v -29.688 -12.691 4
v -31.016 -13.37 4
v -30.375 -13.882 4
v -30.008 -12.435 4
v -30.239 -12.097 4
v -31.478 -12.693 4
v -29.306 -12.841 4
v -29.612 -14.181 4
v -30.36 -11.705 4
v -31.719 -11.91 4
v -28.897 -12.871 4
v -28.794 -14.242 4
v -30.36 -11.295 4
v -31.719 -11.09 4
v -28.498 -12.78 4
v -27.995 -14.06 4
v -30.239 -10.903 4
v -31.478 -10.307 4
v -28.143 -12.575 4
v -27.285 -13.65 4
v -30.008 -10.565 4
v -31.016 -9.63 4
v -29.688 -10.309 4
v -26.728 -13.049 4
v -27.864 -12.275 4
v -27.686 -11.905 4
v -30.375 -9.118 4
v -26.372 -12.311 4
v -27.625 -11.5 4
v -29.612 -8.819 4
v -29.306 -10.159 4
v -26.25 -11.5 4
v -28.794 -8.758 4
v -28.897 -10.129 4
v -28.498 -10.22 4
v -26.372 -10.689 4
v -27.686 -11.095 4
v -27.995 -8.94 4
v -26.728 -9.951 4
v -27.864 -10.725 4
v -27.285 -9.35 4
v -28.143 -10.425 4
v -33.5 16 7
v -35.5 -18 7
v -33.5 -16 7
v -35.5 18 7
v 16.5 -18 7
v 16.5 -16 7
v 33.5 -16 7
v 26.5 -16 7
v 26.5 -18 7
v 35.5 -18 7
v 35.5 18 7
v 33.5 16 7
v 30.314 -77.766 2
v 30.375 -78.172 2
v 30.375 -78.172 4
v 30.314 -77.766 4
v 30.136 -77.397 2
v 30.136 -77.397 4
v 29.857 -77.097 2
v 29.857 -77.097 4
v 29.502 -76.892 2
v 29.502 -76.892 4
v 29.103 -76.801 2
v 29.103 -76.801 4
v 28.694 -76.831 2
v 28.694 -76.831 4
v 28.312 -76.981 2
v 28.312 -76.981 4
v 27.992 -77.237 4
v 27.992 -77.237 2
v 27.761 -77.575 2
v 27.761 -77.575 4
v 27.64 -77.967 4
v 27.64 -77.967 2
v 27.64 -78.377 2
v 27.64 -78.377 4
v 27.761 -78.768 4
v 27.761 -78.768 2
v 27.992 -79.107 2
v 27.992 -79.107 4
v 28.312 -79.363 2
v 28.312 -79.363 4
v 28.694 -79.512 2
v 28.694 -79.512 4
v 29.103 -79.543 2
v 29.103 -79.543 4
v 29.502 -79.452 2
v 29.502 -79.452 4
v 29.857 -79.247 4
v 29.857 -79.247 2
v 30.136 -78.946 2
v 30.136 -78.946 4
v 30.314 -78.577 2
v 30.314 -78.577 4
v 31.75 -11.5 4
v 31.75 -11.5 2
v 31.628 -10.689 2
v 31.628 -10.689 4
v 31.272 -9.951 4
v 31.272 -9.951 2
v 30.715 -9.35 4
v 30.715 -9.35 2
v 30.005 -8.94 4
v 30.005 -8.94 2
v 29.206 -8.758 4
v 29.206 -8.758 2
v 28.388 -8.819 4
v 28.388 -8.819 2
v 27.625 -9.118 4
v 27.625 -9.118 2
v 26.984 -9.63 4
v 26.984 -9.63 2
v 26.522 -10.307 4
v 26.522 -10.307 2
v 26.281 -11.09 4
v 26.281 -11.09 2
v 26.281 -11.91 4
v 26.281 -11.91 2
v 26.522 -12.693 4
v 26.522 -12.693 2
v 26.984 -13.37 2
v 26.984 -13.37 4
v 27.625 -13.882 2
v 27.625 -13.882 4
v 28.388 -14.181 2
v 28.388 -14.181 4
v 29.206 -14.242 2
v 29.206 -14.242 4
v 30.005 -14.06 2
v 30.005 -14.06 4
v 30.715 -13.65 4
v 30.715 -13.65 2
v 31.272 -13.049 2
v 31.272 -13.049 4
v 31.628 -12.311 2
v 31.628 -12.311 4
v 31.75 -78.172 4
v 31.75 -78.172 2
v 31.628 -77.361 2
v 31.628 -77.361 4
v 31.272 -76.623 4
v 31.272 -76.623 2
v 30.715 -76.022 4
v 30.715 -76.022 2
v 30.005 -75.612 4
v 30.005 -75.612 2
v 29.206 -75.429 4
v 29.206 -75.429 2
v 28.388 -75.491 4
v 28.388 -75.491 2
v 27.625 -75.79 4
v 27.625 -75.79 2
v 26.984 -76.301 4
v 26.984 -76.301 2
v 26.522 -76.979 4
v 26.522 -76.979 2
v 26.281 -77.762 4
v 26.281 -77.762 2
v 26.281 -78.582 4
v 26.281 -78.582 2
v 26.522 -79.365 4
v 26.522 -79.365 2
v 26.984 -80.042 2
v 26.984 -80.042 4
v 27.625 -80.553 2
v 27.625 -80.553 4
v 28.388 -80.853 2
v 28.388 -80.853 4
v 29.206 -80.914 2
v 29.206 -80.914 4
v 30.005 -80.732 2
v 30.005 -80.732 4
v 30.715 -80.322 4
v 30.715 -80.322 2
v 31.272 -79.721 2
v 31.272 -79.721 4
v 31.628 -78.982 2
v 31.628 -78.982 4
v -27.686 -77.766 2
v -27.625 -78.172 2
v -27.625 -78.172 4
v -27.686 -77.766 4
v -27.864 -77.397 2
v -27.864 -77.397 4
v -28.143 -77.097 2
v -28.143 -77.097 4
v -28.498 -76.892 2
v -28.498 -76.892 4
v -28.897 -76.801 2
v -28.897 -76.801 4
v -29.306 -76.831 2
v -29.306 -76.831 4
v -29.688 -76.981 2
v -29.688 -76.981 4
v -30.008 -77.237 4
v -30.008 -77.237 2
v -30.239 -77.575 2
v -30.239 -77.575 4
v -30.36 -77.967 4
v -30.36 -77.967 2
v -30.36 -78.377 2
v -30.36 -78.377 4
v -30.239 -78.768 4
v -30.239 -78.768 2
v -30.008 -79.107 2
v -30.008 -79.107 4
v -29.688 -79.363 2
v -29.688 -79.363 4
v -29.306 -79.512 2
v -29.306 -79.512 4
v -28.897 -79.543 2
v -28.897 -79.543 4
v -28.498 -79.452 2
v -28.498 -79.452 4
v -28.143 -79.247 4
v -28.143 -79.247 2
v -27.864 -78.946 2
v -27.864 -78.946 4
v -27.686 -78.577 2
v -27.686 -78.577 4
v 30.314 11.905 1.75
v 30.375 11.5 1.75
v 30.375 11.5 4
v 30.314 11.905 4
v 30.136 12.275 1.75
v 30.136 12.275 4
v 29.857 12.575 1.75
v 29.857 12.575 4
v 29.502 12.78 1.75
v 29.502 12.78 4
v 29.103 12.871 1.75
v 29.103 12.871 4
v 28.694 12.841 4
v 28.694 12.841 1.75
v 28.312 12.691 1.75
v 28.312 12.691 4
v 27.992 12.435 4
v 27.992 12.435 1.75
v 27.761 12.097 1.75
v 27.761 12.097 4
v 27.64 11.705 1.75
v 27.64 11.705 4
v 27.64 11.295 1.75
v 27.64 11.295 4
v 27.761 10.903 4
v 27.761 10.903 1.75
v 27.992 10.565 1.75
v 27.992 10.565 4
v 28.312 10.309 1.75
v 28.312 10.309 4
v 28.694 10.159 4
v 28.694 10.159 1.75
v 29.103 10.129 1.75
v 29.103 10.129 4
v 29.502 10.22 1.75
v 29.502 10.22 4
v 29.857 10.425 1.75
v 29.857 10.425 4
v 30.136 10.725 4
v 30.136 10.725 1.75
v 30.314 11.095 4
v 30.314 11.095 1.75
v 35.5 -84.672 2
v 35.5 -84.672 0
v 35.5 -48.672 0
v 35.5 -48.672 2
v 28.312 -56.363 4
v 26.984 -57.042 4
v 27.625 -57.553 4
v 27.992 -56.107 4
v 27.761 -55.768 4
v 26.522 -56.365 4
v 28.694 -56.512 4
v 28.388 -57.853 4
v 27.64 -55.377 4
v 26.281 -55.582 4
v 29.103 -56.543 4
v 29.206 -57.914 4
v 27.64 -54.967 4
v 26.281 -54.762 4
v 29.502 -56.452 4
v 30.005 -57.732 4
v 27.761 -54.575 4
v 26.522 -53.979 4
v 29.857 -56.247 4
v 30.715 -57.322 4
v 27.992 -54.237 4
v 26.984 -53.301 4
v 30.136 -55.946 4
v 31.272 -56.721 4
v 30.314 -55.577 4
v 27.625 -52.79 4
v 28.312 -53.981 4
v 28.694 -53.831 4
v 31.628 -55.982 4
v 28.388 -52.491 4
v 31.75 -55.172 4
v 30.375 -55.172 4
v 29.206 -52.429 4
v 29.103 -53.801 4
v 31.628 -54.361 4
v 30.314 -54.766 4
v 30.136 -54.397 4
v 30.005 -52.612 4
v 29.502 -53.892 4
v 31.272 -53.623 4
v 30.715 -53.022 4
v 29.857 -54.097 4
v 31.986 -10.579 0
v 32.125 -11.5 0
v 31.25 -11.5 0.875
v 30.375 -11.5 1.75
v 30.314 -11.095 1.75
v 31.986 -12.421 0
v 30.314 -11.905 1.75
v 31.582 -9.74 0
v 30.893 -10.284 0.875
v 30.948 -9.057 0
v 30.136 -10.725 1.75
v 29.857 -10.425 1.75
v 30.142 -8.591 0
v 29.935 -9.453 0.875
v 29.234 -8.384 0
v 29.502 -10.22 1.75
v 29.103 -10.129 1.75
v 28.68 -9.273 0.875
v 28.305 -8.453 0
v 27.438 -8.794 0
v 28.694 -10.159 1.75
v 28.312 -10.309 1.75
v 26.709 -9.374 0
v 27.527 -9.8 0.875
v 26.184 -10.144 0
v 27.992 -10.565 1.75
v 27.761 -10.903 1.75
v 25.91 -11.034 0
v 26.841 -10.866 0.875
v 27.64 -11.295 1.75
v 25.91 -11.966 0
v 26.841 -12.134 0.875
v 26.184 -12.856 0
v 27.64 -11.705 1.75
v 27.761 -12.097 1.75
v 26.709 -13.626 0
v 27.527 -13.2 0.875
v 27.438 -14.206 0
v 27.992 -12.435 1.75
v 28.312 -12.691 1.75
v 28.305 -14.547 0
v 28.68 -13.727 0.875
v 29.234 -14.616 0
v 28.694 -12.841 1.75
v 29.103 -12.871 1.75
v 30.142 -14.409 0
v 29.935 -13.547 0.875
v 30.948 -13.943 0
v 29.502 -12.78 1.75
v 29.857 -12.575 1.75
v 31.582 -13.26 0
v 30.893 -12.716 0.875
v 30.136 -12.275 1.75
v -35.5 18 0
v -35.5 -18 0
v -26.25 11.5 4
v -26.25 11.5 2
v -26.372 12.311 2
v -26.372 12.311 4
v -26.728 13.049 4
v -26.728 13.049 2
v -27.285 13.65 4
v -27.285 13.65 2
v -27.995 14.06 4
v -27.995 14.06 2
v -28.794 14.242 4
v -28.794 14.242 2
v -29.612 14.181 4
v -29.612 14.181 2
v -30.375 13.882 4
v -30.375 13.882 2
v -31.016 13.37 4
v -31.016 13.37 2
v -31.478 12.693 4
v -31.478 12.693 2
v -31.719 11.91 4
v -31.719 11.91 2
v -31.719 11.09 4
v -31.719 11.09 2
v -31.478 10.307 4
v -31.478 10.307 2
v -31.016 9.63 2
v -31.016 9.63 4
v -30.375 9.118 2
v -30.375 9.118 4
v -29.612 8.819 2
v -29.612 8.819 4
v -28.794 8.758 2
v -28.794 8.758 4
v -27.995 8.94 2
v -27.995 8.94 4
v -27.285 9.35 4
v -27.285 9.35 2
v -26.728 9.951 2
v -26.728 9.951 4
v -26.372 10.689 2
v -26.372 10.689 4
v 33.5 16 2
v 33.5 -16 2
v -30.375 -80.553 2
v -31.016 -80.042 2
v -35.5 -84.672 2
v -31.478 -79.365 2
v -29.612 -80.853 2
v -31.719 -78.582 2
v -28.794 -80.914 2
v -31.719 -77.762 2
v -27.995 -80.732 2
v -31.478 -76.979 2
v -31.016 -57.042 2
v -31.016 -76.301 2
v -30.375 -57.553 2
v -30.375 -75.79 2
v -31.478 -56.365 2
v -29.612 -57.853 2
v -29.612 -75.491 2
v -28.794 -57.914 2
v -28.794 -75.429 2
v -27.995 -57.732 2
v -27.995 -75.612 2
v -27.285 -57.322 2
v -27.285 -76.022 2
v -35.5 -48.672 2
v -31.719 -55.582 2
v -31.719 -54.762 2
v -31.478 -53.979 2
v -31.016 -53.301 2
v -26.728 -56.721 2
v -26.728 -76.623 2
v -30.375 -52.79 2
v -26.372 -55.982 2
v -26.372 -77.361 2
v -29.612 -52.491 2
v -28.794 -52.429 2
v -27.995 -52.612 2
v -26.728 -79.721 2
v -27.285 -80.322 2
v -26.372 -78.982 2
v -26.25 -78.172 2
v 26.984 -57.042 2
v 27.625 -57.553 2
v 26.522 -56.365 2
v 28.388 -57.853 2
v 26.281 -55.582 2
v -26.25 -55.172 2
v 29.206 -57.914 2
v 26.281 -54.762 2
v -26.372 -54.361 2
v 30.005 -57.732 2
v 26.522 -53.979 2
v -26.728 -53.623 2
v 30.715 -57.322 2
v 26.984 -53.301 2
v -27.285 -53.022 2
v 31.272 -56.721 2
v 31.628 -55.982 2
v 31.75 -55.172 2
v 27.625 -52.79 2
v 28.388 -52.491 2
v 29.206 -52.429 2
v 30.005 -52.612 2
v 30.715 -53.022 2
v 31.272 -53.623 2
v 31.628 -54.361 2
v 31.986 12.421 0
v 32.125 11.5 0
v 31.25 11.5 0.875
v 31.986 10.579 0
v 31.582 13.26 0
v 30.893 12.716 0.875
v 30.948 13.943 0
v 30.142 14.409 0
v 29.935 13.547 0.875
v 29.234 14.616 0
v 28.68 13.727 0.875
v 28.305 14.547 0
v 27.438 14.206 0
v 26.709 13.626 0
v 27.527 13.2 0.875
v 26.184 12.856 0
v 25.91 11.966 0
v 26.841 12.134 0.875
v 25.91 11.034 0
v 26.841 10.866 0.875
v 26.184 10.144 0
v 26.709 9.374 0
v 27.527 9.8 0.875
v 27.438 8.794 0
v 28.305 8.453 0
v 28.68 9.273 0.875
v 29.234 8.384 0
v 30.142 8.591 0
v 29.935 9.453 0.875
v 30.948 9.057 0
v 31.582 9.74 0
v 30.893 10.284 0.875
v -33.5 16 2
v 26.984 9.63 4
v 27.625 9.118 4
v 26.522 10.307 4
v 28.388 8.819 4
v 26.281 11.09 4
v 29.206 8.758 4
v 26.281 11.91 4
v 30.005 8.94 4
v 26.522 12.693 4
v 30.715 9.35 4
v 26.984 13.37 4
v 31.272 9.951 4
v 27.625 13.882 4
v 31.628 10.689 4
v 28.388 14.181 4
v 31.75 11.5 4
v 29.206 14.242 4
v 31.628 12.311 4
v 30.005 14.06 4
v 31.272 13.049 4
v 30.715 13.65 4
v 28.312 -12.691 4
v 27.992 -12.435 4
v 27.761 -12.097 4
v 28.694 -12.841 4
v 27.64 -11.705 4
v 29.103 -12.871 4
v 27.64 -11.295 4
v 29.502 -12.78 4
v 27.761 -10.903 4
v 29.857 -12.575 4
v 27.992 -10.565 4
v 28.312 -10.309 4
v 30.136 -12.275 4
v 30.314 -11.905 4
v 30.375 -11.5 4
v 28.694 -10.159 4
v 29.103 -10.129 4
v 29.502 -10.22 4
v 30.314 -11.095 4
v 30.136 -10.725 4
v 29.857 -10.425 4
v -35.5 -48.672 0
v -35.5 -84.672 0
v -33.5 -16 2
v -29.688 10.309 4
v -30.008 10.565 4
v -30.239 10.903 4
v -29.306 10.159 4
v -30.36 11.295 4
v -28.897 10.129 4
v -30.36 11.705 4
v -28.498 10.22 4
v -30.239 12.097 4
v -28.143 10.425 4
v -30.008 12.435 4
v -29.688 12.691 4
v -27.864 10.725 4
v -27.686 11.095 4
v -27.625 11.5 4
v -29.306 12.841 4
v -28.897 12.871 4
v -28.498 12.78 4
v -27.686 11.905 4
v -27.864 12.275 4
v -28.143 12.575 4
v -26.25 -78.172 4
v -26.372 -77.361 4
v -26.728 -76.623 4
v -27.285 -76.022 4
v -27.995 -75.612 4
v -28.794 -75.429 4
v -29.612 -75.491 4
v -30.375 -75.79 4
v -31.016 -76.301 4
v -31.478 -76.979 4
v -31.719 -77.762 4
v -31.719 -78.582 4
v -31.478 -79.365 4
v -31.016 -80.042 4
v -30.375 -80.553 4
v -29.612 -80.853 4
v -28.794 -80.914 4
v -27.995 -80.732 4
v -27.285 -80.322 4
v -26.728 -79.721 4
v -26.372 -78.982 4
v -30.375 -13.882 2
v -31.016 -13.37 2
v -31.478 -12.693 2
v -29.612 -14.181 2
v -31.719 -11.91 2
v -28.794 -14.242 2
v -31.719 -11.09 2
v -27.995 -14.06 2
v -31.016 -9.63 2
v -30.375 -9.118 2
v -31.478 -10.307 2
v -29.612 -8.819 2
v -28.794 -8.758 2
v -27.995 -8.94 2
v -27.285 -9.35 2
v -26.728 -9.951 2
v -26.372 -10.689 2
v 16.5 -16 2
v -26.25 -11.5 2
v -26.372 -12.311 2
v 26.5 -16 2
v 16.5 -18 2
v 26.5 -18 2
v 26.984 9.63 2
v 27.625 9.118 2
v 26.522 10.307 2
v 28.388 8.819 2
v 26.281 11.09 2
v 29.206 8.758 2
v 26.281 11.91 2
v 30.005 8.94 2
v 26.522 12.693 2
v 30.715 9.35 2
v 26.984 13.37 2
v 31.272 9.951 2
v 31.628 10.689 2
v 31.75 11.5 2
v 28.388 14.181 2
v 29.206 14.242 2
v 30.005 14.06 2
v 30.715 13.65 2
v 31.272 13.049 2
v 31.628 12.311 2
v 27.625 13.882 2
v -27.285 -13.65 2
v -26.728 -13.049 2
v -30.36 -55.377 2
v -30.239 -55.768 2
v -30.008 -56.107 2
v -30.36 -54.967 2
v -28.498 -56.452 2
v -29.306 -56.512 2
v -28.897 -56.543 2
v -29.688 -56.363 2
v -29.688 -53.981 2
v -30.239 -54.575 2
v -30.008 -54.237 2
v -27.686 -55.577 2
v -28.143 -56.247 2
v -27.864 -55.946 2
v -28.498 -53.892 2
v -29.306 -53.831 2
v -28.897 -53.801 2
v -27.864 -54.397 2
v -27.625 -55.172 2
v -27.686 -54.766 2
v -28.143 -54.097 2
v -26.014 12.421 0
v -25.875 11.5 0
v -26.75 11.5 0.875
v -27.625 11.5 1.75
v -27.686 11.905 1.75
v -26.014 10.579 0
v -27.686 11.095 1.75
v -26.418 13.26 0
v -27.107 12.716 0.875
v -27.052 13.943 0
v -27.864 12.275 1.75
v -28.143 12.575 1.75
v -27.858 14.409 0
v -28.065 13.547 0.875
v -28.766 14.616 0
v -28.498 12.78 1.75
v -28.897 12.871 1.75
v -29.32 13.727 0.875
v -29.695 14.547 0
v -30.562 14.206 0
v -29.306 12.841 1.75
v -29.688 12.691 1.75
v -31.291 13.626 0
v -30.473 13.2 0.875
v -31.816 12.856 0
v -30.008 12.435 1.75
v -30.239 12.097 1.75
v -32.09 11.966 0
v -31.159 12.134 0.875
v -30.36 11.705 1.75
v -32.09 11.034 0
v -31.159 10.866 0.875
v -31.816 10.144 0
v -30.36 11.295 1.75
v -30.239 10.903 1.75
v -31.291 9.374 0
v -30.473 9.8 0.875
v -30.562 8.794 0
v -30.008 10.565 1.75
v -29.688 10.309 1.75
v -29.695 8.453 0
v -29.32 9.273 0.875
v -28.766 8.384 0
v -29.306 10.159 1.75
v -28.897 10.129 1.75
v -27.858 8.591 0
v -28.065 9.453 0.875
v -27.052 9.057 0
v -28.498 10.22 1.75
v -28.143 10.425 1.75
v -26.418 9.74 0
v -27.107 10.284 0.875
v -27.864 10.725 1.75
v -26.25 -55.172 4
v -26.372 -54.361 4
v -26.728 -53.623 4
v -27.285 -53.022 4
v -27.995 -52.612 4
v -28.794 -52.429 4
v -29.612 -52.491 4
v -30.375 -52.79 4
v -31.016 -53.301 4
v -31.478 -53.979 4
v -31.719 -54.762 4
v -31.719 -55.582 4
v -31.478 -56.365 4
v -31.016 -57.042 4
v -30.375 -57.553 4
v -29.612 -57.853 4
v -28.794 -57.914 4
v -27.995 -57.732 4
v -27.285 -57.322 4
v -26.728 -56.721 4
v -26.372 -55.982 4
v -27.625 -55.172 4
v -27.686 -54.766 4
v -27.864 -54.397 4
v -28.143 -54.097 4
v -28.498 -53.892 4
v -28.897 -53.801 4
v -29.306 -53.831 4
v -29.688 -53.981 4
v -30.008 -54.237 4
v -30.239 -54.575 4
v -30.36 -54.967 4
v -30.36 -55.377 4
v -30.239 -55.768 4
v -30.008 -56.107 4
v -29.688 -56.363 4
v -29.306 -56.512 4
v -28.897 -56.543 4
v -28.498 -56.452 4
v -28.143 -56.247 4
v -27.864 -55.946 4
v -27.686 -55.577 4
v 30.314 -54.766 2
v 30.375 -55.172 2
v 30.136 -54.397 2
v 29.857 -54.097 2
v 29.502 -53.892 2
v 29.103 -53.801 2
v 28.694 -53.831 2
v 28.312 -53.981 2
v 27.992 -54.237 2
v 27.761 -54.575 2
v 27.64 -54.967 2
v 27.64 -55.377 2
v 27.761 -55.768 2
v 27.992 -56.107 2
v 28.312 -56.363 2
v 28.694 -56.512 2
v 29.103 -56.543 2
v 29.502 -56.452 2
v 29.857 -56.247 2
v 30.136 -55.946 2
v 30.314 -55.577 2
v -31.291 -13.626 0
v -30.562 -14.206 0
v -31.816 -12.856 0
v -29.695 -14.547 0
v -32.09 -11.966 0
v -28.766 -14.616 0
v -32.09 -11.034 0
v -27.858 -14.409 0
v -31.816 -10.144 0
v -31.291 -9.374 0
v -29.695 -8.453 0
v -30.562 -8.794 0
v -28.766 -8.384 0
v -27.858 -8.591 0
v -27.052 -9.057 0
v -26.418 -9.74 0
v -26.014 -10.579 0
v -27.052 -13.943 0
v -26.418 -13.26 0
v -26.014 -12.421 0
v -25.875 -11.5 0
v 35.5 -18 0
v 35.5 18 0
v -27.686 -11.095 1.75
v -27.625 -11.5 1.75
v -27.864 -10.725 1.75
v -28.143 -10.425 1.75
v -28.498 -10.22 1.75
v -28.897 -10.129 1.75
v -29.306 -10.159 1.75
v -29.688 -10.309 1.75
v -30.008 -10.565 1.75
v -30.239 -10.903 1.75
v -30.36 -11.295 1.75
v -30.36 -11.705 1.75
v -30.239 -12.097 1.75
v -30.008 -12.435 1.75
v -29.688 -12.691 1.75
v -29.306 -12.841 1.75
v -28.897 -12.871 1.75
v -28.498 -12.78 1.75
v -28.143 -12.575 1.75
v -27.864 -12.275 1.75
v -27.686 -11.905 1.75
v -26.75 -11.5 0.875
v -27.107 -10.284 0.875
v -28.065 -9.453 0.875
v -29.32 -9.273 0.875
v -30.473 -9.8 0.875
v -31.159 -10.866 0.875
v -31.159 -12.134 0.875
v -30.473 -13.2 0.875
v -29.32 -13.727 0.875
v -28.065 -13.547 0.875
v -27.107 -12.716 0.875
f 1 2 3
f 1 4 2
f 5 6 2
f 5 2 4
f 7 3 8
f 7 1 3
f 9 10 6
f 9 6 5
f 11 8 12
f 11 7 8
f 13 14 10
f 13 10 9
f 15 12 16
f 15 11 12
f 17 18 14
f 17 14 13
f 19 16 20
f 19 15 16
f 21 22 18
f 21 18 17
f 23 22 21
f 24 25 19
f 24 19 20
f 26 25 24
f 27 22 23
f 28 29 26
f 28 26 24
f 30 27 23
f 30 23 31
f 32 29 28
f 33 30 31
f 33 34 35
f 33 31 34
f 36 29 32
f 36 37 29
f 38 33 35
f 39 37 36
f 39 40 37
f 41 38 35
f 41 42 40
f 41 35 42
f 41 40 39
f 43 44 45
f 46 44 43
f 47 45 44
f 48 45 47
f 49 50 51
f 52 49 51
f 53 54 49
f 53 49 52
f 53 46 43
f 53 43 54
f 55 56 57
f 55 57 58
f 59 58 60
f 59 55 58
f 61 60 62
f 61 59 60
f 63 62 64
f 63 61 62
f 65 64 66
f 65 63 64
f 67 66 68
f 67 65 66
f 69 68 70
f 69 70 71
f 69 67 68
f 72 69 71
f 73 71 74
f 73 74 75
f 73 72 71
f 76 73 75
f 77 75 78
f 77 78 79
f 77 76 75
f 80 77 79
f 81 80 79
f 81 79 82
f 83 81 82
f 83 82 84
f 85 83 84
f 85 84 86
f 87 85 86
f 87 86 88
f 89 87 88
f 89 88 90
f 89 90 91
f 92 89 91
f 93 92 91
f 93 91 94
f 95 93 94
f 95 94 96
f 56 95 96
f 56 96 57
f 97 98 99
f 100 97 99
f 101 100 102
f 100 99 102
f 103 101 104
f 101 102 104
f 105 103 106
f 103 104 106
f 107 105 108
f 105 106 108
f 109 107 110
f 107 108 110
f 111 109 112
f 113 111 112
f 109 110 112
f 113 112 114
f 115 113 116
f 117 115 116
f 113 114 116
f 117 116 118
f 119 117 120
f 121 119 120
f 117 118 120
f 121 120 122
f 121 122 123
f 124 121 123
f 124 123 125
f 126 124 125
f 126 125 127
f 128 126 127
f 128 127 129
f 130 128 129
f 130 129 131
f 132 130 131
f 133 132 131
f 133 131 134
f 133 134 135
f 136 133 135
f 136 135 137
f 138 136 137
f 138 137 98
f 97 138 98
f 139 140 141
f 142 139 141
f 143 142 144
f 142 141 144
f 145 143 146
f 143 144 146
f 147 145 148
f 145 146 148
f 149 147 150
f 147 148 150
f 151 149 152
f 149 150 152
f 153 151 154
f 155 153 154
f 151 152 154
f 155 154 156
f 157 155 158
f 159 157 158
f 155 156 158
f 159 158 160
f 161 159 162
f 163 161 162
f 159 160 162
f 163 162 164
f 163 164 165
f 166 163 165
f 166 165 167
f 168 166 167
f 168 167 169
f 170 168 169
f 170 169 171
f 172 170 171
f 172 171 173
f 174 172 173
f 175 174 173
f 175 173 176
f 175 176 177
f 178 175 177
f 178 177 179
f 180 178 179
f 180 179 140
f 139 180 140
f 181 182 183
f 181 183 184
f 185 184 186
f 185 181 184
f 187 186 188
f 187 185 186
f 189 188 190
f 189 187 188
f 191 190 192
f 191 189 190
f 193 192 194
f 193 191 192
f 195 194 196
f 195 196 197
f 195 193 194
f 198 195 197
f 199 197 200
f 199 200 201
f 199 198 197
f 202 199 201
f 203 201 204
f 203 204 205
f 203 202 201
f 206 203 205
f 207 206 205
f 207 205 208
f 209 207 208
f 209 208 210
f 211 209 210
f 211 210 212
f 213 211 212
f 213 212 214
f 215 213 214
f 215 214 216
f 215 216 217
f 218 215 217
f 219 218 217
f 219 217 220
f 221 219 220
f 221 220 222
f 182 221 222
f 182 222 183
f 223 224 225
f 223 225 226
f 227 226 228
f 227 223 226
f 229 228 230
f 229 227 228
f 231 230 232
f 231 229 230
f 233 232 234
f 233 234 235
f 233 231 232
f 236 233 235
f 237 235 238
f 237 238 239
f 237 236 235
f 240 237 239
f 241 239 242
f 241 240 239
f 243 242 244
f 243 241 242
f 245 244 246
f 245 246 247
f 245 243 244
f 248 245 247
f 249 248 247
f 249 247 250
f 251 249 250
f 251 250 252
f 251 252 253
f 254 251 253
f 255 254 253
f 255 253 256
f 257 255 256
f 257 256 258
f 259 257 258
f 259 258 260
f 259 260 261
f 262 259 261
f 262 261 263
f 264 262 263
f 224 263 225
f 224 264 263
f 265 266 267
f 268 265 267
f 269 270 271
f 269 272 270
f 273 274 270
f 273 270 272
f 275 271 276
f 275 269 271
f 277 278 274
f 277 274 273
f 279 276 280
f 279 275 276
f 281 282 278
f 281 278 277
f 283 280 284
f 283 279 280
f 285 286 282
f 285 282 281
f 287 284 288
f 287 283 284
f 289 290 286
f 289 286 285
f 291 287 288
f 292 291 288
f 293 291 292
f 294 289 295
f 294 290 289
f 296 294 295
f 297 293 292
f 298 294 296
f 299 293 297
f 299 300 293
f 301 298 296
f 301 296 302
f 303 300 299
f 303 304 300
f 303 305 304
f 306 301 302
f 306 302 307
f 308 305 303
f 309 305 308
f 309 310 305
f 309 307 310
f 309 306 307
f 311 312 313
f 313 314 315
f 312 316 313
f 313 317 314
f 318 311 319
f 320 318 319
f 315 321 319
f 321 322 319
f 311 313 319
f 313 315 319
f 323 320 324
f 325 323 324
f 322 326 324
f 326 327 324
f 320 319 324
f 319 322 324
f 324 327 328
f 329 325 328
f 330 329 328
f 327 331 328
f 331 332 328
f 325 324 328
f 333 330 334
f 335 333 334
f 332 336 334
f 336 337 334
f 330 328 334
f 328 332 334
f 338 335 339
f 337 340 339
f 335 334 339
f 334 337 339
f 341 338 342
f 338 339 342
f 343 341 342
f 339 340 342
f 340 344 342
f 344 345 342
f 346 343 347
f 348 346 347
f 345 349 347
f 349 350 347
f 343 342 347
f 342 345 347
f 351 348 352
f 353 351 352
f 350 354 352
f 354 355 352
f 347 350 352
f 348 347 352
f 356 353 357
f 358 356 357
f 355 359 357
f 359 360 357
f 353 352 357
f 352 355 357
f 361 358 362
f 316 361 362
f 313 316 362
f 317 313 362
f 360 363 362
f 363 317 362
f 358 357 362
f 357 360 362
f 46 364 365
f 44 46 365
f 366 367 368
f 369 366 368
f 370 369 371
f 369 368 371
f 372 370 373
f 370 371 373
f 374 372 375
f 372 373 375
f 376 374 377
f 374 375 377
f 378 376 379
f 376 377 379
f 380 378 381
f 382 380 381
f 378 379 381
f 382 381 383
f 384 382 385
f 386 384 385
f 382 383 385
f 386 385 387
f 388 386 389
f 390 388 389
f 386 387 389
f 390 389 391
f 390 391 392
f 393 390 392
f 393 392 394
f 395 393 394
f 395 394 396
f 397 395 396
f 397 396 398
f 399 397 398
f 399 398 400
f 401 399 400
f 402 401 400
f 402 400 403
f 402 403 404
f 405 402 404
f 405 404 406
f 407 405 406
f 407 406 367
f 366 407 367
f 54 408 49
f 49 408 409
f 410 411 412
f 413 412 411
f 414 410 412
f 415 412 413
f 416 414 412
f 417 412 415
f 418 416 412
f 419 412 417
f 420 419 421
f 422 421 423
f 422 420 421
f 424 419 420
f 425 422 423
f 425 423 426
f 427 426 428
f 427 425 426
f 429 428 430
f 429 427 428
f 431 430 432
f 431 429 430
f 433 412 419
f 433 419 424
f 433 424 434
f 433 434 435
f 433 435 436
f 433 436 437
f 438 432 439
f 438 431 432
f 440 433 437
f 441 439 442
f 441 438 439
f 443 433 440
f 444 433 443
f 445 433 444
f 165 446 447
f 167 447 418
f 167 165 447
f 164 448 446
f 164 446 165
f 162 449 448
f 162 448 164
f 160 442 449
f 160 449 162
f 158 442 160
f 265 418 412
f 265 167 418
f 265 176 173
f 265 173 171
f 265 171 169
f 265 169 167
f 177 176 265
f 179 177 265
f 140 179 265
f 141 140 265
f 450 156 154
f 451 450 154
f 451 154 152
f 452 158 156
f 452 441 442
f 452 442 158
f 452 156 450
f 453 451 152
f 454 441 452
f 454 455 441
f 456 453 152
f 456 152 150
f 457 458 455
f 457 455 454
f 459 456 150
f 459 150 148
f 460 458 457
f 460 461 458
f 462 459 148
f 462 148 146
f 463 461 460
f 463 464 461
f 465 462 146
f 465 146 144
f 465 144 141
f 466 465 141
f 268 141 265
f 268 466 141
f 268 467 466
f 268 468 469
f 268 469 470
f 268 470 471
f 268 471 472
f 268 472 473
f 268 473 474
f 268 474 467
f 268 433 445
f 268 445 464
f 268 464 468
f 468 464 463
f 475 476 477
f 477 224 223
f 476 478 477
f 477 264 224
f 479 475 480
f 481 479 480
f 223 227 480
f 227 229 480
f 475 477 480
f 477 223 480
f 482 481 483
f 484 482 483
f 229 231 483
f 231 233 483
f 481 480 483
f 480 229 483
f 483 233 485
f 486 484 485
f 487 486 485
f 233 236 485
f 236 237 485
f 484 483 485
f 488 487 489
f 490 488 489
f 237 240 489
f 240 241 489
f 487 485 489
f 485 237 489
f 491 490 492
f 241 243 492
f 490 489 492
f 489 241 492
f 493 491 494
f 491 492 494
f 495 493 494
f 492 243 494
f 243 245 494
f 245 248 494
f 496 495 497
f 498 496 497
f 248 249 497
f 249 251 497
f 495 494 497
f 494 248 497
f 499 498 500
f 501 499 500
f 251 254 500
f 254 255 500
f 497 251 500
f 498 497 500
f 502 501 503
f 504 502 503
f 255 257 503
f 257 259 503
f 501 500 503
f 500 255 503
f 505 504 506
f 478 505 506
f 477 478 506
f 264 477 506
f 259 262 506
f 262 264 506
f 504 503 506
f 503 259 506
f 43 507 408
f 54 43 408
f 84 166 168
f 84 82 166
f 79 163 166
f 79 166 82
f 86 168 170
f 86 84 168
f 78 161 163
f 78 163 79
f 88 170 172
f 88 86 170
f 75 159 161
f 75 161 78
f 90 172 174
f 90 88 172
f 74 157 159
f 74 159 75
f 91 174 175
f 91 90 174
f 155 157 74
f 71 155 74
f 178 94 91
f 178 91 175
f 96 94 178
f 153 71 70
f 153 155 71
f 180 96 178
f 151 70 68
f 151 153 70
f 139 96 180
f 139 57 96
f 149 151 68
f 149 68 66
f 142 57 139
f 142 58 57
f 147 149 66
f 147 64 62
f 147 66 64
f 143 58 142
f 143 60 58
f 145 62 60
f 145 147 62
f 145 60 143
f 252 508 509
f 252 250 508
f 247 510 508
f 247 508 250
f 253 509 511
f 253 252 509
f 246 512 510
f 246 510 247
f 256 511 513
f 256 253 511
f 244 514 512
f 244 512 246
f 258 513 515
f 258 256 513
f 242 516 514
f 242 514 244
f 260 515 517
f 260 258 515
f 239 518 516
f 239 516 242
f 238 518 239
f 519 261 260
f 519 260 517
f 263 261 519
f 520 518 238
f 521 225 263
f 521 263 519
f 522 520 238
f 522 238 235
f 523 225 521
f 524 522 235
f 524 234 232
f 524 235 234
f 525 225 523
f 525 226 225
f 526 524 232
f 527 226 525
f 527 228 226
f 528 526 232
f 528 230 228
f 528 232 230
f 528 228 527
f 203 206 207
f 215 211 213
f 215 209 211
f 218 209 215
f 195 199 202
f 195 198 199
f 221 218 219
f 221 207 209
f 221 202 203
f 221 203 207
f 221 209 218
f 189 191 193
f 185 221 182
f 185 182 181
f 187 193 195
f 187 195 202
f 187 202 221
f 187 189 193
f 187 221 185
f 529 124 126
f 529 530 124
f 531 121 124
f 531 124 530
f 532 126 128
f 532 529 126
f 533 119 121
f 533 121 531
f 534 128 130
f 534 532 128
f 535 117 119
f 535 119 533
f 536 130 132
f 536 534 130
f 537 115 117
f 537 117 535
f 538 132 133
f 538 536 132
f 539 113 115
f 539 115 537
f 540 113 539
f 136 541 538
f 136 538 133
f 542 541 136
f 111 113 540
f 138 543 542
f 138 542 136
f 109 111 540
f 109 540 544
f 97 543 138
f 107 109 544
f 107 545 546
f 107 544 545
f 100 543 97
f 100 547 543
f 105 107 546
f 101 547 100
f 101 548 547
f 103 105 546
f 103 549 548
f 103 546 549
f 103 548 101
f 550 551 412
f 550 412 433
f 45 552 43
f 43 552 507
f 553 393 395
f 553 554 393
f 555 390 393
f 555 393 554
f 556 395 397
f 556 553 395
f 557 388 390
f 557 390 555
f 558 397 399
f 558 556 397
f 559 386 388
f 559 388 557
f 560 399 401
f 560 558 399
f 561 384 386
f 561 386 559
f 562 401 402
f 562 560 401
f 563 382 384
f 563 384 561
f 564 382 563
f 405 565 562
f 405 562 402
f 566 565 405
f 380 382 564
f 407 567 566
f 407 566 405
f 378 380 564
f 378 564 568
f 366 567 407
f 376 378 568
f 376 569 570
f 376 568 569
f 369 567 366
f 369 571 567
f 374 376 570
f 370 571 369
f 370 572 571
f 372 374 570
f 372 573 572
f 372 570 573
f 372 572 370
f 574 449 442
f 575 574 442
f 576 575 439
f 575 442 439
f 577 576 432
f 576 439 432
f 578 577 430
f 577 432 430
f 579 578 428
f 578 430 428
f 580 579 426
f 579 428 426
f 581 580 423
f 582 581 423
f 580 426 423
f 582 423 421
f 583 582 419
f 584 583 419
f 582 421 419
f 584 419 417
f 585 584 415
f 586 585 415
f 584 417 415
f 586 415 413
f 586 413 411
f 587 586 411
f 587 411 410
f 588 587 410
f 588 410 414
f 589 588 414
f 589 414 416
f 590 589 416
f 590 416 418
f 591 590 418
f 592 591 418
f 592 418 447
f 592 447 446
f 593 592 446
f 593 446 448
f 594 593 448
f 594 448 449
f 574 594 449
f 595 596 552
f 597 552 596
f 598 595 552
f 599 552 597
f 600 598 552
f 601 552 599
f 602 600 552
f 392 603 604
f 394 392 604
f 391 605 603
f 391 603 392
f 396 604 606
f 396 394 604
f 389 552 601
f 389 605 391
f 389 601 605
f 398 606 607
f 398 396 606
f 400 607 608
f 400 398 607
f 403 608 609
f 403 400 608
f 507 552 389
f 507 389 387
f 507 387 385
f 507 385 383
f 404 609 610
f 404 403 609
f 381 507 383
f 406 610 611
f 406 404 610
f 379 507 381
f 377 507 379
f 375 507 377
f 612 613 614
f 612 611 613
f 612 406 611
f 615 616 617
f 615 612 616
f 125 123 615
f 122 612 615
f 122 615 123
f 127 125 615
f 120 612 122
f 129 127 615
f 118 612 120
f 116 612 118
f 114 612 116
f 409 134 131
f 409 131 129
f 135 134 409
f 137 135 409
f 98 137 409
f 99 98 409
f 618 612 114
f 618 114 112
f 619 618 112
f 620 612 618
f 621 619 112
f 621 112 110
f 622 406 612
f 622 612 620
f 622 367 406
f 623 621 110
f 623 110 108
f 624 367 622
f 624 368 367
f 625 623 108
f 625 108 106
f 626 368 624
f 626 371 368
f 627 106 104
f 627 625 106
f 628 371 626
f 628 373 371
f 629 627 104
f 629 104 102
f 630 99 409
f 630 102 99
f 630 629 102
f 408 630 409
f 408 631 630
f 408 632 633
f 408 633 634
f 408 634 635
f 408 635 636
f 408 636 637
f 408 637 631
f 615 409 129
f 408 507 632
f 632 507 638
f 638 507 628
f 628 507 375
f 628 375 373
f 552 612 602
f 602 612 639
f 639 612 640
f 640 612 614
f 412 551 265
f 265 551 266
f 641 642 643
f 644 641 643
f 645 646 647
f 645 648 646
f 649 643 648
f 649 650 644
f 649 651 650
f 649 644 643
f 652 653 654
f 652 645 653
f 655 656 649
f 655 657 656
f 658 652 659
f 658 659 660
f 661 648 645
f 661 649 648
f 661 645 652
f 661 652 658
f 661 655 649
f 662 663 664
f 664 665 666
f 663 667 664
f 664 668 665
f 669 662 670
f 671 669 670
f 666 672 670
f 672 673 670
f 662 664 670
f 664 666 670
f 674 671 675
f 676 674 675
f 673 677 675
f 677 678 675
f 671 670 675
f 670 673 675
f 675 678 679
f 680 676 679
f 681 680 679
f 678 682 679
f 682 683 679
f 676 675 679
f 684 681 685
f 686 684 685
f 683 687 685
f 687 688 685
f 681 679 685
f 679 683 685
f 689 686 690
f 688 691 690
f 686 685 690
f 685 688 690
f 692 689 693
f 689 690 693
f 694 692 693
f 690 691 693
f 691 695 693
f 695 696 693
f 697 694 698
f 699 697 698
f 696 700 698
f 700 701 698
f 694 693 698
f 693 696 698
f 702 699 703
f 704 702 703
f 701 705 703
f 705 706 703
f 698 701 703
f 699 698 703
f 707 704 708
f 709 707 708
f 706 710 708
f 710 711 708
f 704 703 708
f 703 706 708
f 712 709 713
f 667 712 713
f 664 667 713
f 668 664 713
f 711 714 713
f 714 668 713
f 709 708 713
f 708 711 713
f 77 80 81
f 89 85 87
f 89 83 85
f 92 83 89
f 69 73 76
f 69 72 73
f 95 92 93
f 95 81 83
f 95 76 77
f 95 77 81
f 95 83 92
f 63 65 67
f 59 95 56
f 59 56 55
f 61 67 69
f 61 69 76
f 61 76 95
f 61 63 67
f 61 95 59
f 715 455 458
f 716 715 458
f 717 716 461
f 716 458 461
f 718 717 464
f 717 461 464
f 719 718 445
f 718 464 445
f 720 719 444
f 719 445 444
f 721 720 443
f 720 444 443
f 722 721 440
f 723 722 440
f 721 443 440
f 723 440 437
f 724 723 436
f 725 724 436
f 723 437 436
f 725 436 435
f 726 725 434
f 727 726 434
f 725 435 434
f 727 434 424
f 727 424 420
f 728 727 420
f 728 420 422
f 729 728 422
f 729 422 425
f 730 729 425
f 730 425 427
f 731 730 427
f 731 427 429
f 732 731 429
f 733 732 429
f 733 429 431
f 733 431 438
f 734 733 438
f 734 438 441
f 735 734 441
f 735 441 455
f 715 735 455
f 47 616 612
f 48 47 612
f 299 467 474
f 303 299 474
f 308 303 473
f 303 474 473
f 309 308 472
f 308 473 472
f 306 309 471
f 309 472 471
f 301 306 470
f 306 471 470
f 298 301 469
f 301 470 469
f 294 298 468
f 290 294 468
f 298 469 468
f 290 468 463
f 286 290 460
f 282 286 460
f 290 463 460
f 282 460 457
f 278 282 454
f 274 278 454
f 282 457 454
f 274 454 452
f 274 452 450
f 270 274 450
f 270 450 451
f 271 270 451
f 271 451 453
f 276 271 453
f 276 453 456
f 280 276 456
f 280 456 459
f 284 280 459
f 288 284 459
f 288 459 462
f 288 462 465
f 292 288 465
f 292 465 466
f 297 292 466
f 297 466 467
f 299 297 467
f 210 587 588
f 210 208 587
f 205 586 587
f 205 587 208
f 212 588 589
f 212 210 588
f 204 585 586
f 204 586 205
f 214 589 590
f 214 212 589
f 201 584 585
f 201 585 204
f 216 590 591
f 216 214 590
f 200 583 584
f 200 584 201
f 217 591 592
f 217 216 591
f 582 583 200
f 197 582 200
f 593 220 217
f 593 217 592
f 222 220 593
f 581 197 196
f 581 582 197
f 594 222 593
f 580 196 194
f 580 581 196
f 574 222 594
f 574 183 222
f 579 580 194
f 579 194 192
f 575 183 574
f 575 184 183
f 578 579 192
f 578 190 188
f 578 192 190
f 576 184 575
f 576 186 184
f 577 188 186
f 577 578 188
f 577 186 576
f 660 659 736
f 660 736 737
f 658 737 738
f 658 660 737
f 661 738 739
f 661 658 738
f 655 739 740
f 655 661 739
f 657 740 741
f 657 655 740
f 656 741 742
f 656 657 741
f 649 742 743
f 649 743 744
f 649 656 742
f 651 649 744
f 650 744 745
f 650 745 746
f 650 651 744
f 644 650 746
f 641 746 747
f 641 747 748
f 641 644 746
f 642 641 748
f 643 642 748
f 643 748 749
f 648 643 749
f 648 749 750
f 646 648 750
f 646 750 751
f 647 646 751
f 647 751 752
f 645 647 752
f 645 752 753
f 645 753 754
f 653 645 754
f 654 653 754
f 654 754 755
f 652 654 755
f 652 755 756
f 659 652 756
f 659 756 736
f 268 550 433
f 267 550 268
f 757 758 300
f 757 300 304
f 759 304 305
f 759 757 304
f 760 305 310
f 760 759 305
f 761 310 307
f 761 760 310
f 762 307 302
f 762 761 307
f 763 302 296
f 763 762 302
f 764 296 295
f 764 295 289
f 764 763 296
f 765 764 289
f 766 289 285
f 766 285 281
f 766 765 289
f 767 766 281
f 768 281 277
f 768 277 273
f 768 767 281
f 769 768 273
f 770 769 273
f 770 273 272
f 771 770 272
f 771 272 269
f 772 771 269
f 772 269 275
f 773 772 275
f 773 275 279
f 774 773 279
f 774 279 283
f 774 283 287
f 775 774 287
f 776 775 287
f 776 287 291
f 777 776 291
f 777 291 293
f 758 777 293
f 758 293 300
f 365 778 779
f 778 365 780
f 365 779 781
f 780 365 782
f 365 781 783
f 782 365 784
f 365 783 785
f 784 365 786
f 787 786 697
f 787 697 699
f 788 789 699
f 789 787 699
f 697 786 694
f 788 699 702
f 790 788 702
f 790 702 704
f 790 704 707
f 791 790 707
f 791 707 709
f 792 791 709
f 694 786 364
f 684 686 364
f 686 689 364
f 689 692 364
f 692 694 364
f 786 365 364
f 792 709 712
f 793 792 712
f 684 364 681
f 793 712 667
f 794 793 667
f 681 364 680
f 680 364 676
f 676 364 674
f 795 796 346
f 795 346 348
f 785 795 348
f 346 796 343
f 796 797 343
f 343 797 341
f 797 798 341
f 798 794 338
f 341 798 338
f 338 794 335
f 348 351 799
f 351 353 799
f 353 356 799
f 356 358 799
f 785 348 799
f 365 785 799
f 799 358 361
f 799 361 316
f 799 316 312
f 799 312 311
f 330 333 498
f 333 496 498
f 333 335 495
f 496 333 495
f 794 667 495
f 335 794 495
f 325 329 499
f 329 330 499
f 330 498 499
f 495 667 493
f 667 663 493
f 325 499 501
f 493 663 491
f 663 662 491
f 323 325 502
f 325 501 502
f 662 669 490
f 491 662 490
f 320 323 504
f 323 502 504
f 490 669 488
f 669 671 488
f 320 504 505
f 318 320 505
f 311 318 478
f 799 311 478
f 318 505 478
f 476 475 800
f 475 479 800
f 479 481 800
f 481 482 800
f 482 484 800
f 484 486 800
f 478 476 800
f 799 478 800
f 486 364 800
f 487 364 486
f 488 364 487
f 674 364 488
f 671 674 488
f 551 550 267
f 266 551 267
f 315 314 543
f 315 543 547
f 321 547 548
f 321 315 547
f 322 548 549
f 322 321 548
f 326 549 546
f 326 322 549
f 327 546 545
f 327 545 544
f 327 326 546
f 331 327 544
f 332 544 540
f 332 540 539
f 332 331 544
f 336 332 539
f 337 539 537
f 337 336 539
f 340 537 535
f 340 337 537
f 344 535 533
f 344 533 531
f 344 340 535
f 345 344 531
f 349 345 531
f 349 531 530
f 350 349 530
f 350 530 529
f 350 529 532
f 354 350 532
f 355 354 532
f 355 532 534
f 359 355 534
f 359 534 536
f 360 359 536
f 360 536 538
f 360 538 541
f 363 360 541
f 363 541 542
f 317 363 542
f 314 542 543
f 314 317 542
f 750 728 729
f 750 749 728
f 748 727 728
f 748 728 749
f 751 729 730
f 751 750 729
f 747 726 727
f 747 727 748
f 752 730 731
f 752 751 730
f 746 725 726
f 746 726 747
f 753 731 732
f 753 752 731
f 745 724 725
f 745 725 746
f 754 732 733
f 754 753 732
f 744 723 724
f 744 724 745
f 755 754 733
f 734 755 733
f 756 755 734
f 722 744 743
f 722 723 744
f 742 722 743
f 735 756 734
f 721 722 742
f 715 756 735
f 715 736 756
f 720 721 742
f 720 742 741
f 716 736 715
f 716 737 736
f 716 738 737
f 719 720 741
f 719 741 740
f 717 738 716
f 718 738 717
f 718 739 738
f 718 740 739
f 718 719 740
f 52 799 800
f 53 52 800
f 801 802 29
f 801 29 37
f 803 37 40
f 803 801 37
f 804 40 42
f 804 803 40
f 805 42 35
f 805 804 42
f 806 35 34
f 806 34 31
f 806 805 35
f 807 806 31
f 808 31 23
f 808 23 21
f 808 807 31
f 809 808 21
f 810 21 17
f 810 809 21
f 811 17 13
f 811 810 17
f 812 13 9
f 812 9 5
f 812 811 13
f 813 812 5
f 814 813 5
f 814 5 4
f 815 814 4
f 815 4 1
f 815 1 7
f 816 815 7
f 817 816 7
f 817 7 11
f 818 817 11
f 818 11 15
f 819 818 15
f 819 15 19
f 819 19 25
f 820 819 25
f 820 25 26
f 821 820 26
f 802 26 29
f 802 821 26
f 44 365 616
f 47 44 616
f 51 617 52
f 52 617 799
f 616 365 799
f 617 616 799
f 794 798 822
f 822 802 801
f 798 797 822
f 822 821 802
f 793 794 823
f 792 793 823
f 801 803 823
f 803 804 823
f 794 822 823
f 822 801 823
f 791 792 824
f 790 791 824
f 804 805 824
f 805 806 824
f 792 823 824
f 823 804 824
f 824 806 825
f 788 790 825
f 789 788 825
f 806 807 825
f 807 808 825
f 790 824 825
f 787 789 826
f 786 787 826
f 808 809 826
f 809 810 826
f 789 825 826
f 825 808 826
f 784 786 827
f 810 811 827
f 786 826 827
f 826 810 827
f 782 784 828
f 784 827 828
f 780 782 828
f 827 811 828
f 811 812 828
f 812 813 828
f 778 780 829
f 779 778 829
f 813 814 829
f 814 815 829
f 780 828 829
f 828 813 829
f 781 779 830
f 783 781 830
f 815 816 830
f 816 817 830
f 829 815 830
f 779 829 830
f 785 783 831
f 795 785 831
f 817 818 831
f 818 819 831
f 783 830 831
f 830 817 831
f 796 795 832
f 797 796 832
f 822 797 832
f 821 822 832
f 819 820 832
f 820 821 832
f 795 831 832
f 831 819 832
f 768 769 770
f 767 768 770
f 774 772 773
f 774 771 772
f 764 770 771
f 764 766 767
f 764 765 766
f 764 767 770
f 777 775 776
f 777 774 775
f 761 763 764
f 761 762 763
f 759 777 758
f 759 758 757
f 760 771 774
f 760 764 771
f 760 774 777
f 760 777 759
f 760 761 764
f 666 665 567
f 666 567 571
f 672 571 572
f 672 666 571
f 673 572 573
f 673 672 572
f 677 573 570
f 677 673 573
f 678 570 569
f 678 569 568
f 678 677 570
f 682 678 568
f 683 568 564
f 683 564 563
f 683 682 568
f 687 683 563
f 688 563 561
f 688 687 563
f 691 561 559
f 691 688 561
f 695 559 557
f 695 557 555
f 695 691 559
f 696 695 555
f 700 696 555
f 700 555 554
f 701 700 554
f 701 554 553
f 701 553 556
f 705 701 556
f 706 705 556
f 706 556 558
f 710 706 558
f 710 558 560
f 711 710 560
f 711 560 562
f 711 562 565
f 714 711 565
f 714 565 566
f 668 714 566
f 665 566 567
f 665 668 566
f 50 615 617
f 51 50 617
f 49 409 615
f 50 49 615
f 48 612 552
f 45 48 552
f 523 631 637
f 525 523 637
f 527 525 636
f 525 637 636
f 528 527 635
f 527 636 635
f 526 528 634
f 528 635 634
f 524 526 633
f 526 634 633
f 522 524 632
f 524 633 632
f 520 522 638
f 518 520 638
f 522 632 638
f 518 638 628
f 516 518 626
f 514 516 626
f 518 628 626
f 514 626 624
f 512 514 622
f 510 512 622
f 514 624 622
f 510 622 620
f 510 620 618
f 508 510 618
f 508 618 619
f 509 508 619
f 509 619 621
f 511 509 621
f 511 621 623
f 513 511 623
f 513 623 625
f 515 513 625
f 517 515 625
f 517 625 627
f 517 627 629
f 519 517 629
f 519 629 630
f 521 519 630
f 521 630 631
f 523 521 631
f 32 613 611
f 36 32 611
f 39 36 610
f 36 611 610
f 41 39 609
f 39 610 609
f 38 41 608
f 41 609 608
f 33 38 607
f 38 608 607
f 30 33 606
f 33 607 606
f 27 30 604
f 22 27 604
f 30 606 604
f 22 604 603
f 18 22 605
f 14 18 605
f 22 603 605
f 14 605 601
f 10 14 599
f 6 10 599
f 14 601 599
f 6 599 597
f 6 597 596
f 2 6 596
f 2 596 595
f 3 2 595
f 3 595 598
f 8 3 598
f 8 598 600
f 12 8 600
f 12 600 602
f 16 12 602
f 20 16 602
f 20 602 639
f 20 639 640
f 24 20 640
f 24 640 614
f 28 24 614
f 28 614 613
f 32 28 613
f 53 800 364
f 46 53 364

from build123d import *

# Parameters (mm, degrees)
F0_R     = 2.75
F0_R_2   = 1.375
F0_W     = 10
F0_H     = 2
F1_DEPTH = 2
F2_DEPTH = 4
F3_DEPTH = 7
F4_SIZE  = 1.75
F5_W     = 71
F5_H     = 36
F5_R     = 2.75
F5_R_2   = 1.375
F6_DEPTH = 2
F7_DEPTH = 4


with BuildPart() as f1:
    # F0 (on Top) → F1 (new body)
    with BuildSketch(Plane.XY):
        Polygon((33.5, -16), (26.5, -16), (26.5, -18), (35.5, -18), (35.5, 18), (-35.5, 18), (-35.5, -18), (16.5, -18), (16.5, -16), (-33.5, -16), (-33.5, 16), (33.5, 16), align=None)
        Polygon((-32.5, 15), (32.5, 15), (32.5, -15), (26.5, -15), (26.5, -16), (33.5, -16), (33.5, 16), (-33.5, 16), (-33.5, -16), (16.5, -16), (16.5, -15), (-32.5, -15), align=None)
        Polygon((32.5, -15), (32.5, 15), (-32.5, 15), (-32.5, -15), (16.5, -15), (21.5, -15), (26.5, -15), align=None)
        with Locations((-29, -11.5)):
            Circle(F0_R, mode=Mode.SUBTRACT)
        with Locations((29, -11.5)):
            Circle(F0_R, mode=Mode.SUBTRACT)
        with Locations((-29, 11.5)):
            Circle(F0_R, mode=Mode.SUBTRACT)
        with Locations((29, 11.5)):
            Circle(F0_R, mode=Mode.SUBTRACT)
        with Locations((-29, 11.5)):
            Circle(F0_R)
        with Locations((-29, 11.5)):
            Circle(F0_R_2, mode=Mode.SUBTRACT)
        with Locations((-29, -11.5)):
            Circle(F0_R)
        with Locations((-29, -11.5)):
            Circle(F0_R_2, mode=Mode.SUBTRACT)
        with Locations((29, 11.5)):
            Circle(F0_R)
        with Locations((29, 11.5)):
            Circle(F0_R_2, mode=Mode.SUBTRACT)
        with Locations((29, -11.5)):
            Circle(F0_R)
        with Locations((29, -11.5)):
            Circle(F0_R_2, mode=Mode.SUBTRACT)
        with Locations((21.5, -17)):
            Rectangle(F0_W, F0_H)
        Polygon((26.5, -16), (26.5, -15), (21.5, -15), (16.5, -15), (16.5, -16), align=None)
    extrude(amount=F1_DEPTH)

    # F0 (on Top) → F2 (join)
    with BuildSketch(Plane.XY):
        with Locations((-29, -11.5)):
            Circle(F0_R)
        with Locations((-29, -11.5)):
            Circle(F0_R_2, mode=Mode.SUBTRACT)
        with Locations((29, -11.5)):
            Circle(F0_R)
        with Locations((29, -11.5)):
            Circle(F0_R_2, mode=Mode.SUBTRACT)
        with Locations((29, 11.5)):
            Circle(F0_R)
        with Locations((29, 11.5)):
            Circle(F0_R_2, mode=Mode.SUBTRACT)
        with Locations((-29, 11.5)):
            Circle(F0_R)
        with Locations((-29, 11.5)):
            Circle(F0_R_2, mode=Mode.SUBTRACT)
    extrude(amount=F2_DEPTH)

    # F0 (on Top) → F3 (join)
    with BuildSketch(Plane.XY):
        Polygon((33.5, -16), (26.5, -16), (26.5, -18), (35.5, -18), (35.5, 18), (-35.5, 18), (-35.5, -18), (16.5, -18), (16.5, -16), (-33.5, -16), (-33.5, 16), (33.5, 16), align=None)
    extrude(amount=F3_DEPTH)

    # F4
    f4_edges = [f1.edges().sort_by_distance(p)[0] for p in [
        (27.625, -11.5, 0),
        (27.625, 11.5, 0),
        (-30.375, 11.5, 0),
        (-30.375, -11.5, 0),
    ]]
    chamfer(f4_edges, length=F4_SIZE)


with BuildPart() as f6:
    # F5 (on Top) → F6 (new body)
    with BuildSketch(Plane.XY):
        with Locations((0, -66.6717812419)):
            Rectangle(F5_W, F5_H)
        with Locations((-29, -78.1717812419)):
            Circle(F5_R, mode=Mode.SUBTRACT)
        with Locations((29, -78.1717812419)):
            Circle(F5_R, mode=Mode.SUBTRACT)
        with Locations((-29, -55.1717812419)):
            Circle(F5_R, mode=Mode.SUBTRACT)
        with Locations((29, -55.1717812419)):
            Circle(F5_R, mode=Mode.SUBTRACT)
        with Locations((-29, -55.1717812419)):
            Circle(F5_R)
        with Locations((-29, -55.1717812419)):
            Circle(F5_R_2, mode=Mode.SUBTRACT)
        with Locations((-29, -78.1717812419)):
            Circle(F5_R)
        with Locations((-29, -78.1717812419)):
            Circle(F5_R_2, mode=Mode.SUBTRACT)
        with Locations((29, -78.1717812419)):
            Circle(F5_R)
        with Locations((29, -78.1717812419)):
            Circle(F5_R_2, mode=Mode.SUBTRACT)
        with Locations((29, -55.1717812419)):
            Circle(F5_R)
        with Locations((29, -55.1717812419)):
            Circle(F5_R_2, mode=Mode.SUBTRACT)
        with Locations((-29, -55.1717812419)):
            Circle(F5_R_2)
        with Locations((-29, -78.1717812419)):
            Circle(F5_R_2)
        with Locations((29, -78.1717812419)):
            Circle(F5_R_2)
        with Locations((29, -55.1717812419)):
            Circle(F5_R_2)
    extrude(amount=F6_DEPTH)

    # F5 (on Top) → F7 (join)
    with BuildSketch(Plane.XY):
        with Locations((-29, -78.1717812419)):
            Circle(F5_R)
        with Locations((-29, -78.1717812419)):
            Circle(F5_R_2, mode=Mode.SUBTRACT)
        with Locations((-29, -55.1717812419)):
            Circle(F5_R)
        with Locations((-29, -55.1717812419)):
            Circle(F5_R_2, mode=Mode.SUBTRACT)
        with Locations((29, -78.1717812419)):
            Circle(F5_R)
        with Locations((29, -78.1717812419)):
            Circle(F5_R_2, mode=Mode.SUBTRACT)
        with Locations((29, -55.1717812419)):
            Circle(F5_R)
        with Locations((29, -55.1717812419)):
            Circle(F5_R_2, mode=Mode.SUBTRACT)
    extrude(amount=F7_DEPTH)


solid = Compound([f1.part, f6.part])
